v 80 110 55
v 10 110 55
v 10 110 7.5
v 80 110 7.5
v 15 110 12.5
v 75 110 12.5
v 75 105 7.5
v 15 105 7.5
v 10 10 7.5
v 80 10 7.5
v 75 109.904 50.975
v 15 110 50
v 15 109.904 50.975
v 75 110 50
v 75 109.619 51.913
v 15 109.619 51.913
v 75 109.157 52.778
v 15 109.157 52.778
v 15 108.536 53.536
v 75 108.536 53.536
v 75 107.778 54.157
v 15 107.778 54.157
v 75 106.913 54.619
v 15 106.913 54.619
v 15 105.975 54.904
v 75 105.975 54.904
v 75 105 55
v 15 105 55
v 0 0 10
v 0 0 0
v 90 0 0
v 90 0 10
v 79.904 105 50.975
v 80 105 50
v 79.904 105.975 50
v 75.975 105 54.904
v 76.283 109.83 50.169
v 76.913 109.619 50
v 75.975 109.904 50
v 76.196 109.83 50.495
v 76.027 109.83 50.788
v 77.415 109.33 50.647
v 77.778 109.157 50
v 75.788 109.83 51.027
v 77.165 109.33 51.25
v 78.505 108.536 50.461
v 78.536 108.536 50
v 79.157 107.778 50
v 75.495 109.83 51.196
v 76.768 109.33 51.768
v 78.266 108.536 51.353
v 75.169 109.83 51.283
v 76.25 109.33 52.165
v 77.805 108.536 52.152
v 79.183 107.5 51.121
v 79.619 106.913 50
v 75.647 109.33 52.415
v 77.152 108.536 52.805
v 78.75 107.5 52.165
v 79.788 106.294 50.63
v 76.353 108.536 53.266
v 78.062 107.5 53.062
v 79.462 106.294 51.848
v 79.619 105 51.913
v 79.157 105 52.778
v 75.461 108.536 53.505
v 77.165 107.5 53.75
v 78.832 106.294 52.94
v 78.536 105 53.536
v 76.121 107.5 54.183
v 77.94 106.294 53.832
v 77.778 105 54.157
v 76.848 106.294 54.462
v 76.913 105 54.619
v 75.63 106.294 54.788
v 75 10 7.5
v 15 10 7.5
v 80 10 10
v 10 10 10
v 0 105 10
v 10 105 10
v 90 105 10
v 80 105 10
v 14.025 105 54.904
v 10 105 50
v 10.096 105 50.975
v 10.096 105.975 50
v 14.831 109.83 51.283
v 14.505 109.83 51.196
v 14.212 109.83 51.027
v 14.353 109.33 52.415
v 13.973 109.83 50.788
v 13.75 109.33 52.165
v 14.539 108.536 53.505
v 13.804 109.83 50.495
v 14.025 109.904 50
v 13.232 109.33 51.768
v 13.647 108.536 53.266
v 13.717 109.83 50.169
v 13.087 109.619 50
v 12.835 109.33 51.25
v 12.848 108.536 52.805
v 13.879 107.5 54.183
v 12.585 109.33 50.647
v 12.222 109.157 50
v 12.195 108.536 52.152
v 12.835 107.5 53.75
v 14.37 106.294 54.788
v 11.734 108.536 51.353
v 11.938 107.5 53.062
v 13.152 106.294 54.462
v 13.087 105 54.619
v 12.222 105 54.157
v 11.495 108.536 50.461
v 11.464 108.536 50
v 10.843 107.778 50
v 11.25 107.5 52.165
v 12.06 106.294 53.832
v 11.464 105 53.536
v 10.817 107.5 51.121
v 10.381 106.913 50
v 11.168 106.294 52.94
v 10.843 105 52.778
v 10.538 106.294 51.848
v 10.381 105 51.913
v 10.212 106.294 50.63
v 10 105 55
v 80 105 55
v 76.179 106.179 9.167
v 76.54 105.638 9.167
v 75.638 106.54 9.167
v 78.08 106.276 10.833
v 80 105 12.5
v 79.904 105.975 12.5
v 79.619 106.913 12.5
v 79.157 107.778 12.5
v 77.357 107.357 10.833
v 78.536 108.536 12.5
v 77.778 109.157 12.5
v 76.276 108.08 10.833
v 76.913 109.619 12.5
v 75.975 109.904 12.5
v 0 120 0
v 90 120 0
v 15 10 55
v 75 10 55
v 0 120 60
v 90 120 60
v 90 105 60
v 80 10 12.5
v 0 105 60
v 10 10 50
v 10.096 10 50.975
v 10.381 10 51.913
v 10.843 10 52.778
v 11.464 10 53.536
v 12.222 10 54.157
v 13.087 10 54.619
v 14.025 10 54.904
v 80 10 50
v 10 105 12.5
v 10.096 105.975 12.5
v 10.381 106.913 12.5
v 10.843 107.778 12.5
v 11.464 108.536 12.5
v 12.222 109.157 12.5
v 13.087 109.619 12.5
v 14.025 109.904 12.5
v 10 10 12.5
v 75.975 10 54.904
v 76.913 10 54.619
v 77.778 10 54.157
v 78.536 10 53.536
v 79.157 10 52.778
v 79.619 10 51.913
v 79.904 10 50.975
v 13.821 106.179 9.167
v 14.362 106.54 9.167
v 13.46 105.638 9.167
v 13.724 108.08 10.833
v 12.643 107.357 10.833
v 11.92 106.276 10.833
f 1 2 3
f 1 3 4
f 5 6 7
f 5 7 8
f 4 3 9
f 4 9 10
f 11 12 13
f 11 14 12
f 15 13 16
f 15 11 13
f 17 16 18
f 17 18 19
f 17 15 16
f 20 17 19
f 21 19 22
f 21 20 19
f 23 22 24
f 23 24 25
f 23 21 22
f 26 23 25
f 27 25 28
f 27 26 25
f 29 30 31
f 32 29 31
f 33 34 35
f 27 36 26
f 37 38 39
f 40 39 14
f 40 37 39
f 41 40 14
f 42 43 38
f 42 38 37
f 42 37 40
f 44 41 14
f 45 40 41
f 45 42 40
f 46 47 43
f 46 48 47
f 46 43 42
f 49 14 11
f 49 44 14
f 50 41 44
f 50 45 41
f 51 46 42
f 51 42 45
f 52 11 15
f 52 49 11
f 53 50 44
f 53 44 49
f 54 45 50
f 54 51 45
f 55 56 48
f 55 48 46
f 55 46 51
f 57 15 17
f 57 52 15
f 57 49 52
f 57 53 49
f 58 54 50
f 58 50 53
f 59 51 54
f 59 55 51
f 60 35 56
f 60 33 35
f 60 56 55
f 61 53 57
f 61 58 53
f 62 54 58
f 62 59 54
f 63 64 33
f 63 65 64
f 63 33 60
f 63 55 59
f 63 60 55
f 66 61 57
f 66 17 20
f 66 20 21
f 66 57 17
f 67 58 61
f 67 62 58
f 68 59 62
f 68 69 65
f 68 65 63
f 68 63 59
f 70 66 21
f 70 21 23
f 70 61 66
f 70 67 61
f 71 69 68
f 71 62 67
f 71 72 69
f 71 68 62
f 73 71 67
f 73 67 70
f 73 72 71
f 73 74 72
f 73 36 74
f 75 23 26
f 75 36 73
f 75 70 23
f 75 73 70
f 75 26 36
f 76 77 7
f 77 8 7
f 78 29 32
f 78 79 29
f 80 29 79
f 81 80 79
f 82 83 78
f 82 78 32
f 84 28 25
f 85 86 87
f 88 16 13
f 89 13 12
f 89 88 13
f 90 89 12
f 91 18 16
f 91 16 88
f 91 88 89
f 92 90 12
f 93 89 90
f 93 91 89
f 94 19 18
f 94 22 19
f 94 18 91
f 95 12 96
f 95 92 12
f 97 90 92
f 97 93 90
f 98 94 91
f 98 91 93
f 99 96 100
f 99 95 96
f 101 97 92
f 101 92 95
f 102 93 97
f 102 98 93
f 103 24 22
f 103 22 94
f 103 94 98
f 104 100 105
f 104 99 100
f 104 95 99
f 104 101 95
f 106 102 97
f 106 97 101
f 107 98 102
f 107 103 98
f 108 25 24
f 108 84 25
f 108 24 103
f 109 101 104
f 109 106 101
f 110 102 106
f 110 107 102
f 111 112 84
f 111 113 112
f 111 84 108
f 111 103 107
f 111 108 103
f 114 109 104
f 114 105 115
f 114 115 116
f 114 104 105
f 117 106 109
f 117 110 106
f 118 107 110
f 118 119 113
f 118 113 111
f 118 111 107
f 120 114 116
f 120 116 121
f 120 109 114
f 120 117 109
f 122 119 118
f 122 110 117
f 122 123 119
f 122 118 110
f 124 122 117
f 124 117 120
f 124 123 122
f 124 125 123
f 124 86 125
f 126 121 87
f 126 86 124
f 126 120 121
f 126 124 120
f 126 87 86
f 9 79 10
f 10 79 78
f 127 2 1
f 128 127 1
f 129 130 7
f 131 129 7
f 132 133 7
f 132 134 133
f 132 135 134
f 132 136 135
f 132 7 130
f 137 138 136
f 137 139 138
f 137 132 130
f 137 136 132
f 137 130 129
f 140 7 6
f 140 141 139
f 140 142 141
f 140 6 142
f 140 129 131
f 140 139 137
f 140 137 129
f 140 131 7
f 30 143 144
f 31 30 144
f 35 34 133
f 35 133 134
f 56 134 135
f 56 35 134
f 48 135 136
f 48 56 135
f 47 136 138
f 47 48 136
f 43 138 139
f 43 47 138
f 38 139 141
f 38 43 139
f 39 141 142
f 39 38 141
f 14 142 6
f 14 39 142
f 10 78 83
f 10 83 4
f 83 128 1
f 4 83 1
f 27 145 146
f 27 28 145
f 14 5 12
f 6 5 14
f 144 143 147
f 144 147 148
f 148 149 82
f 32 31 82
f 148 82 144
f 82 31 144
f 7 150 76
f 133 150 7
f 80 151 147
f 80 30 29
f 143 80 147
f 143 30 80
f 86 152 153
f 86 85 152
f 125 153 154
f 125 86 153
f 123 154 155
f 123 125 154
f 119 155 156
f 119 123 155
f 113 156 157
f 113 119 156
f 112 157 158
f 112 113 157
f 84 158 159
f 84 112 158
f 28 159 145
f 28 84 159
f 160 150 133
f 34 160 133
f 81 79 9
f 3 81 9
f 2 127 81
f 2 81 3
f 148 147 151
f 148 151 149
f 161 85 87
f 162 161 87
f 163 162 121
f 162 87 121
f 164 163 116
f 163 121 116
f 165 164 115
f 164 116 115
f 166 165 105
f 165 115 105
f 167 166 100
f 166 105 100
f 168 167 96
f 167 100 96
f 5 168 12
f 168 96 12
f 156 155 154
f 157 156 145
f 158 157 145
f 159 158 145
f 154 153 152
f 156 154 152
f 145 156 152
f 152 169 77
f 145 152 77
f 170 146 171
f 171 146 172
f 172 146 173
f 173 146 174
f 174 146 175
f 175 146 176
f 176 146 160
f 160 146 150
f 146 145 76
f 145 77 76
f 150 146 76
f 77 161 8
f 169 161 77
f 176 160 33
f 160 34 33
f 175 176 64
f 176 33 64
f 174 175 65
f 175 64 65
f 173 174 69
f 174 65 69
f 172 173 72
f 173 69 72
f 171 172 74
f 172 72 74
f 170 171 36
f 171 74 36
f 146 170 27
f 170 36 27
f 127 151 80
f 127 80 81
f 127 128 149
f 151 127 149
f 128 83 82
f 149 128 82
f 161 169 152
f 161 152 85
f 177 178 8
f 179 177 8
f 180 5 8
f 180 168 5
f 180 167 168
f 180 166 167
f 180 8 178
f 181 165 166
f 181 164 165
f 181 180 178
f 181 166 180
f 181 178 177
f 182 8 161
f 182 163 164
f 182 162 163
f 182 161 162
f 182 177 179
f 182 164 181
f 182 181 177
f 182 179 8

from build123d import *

# Parameters (mm, degrees)
F0_W     = 90
F0_H     = 120
F1_DEPTH = 10
F2_W     = 90
F2_H     = 15
F3_DEPTH = 50
F5_W     = 70
F5_H     = 100
F6_DEPTH = 47.5
F7_DEPTH = 47.5
F8_R     = 5
F9_SIZE  = 5


with BuildPart() as f1:
    # F0 (on Top) → F1 (new body)
    with BuildSketch(Plane.XY):
        with Locations((45, 60)):
            Rectangle(F0_W, F0_H)
    extrude(amount=F1_DEPTH)

    # F2 (on face) → F3 (join)
    with BuildSketch(Plane.XY.offset(10)):
        with Locations((45, 112.5)):
            Rectangle(F2_W, F2_H)
    extrude(amount=F3_DEPTH)

    # F5 (on offset) → F6 (cut)
    with BuildSketch(Plane.XY.offset(55)):
        with Locations((45, 60)):
            Rectangle(F5_W, F5_H)
    extrude(amount=-F6_DEPTH, mode=Mode.SUBTRACT)


with BuildPart() as f7:
    # F7 (new, through all): a face of the model
    f7_faces = [f1.part.faces().sort_by_distance(p)[0] for p in [
        (45, 60, 7.5),
    ]]
    extrude(f7_faces, amount=F7_DEPTH)

    # F8
    f8_edges = [f7.edges().sort_by_distance(p)[0] for p in [
        (80, 60, 55),
        (10, 60, 55),
        (80, 110, 31.25),
        (45, 110, 55),
        (10, 110, 31.25),
    ]]
    fillet(f8_edges, radius=F8_R)

    # F9
    f9_edges = [f7.edges().sort_by_distance(p)[0] for p in [
        (80, 57.5, 7.5),
        (10, 57.5, 7.5),
    ]]
    chamfer(f9_edges, length=F9_SIZE)


solid = Compound([f1.part, f7.part])
